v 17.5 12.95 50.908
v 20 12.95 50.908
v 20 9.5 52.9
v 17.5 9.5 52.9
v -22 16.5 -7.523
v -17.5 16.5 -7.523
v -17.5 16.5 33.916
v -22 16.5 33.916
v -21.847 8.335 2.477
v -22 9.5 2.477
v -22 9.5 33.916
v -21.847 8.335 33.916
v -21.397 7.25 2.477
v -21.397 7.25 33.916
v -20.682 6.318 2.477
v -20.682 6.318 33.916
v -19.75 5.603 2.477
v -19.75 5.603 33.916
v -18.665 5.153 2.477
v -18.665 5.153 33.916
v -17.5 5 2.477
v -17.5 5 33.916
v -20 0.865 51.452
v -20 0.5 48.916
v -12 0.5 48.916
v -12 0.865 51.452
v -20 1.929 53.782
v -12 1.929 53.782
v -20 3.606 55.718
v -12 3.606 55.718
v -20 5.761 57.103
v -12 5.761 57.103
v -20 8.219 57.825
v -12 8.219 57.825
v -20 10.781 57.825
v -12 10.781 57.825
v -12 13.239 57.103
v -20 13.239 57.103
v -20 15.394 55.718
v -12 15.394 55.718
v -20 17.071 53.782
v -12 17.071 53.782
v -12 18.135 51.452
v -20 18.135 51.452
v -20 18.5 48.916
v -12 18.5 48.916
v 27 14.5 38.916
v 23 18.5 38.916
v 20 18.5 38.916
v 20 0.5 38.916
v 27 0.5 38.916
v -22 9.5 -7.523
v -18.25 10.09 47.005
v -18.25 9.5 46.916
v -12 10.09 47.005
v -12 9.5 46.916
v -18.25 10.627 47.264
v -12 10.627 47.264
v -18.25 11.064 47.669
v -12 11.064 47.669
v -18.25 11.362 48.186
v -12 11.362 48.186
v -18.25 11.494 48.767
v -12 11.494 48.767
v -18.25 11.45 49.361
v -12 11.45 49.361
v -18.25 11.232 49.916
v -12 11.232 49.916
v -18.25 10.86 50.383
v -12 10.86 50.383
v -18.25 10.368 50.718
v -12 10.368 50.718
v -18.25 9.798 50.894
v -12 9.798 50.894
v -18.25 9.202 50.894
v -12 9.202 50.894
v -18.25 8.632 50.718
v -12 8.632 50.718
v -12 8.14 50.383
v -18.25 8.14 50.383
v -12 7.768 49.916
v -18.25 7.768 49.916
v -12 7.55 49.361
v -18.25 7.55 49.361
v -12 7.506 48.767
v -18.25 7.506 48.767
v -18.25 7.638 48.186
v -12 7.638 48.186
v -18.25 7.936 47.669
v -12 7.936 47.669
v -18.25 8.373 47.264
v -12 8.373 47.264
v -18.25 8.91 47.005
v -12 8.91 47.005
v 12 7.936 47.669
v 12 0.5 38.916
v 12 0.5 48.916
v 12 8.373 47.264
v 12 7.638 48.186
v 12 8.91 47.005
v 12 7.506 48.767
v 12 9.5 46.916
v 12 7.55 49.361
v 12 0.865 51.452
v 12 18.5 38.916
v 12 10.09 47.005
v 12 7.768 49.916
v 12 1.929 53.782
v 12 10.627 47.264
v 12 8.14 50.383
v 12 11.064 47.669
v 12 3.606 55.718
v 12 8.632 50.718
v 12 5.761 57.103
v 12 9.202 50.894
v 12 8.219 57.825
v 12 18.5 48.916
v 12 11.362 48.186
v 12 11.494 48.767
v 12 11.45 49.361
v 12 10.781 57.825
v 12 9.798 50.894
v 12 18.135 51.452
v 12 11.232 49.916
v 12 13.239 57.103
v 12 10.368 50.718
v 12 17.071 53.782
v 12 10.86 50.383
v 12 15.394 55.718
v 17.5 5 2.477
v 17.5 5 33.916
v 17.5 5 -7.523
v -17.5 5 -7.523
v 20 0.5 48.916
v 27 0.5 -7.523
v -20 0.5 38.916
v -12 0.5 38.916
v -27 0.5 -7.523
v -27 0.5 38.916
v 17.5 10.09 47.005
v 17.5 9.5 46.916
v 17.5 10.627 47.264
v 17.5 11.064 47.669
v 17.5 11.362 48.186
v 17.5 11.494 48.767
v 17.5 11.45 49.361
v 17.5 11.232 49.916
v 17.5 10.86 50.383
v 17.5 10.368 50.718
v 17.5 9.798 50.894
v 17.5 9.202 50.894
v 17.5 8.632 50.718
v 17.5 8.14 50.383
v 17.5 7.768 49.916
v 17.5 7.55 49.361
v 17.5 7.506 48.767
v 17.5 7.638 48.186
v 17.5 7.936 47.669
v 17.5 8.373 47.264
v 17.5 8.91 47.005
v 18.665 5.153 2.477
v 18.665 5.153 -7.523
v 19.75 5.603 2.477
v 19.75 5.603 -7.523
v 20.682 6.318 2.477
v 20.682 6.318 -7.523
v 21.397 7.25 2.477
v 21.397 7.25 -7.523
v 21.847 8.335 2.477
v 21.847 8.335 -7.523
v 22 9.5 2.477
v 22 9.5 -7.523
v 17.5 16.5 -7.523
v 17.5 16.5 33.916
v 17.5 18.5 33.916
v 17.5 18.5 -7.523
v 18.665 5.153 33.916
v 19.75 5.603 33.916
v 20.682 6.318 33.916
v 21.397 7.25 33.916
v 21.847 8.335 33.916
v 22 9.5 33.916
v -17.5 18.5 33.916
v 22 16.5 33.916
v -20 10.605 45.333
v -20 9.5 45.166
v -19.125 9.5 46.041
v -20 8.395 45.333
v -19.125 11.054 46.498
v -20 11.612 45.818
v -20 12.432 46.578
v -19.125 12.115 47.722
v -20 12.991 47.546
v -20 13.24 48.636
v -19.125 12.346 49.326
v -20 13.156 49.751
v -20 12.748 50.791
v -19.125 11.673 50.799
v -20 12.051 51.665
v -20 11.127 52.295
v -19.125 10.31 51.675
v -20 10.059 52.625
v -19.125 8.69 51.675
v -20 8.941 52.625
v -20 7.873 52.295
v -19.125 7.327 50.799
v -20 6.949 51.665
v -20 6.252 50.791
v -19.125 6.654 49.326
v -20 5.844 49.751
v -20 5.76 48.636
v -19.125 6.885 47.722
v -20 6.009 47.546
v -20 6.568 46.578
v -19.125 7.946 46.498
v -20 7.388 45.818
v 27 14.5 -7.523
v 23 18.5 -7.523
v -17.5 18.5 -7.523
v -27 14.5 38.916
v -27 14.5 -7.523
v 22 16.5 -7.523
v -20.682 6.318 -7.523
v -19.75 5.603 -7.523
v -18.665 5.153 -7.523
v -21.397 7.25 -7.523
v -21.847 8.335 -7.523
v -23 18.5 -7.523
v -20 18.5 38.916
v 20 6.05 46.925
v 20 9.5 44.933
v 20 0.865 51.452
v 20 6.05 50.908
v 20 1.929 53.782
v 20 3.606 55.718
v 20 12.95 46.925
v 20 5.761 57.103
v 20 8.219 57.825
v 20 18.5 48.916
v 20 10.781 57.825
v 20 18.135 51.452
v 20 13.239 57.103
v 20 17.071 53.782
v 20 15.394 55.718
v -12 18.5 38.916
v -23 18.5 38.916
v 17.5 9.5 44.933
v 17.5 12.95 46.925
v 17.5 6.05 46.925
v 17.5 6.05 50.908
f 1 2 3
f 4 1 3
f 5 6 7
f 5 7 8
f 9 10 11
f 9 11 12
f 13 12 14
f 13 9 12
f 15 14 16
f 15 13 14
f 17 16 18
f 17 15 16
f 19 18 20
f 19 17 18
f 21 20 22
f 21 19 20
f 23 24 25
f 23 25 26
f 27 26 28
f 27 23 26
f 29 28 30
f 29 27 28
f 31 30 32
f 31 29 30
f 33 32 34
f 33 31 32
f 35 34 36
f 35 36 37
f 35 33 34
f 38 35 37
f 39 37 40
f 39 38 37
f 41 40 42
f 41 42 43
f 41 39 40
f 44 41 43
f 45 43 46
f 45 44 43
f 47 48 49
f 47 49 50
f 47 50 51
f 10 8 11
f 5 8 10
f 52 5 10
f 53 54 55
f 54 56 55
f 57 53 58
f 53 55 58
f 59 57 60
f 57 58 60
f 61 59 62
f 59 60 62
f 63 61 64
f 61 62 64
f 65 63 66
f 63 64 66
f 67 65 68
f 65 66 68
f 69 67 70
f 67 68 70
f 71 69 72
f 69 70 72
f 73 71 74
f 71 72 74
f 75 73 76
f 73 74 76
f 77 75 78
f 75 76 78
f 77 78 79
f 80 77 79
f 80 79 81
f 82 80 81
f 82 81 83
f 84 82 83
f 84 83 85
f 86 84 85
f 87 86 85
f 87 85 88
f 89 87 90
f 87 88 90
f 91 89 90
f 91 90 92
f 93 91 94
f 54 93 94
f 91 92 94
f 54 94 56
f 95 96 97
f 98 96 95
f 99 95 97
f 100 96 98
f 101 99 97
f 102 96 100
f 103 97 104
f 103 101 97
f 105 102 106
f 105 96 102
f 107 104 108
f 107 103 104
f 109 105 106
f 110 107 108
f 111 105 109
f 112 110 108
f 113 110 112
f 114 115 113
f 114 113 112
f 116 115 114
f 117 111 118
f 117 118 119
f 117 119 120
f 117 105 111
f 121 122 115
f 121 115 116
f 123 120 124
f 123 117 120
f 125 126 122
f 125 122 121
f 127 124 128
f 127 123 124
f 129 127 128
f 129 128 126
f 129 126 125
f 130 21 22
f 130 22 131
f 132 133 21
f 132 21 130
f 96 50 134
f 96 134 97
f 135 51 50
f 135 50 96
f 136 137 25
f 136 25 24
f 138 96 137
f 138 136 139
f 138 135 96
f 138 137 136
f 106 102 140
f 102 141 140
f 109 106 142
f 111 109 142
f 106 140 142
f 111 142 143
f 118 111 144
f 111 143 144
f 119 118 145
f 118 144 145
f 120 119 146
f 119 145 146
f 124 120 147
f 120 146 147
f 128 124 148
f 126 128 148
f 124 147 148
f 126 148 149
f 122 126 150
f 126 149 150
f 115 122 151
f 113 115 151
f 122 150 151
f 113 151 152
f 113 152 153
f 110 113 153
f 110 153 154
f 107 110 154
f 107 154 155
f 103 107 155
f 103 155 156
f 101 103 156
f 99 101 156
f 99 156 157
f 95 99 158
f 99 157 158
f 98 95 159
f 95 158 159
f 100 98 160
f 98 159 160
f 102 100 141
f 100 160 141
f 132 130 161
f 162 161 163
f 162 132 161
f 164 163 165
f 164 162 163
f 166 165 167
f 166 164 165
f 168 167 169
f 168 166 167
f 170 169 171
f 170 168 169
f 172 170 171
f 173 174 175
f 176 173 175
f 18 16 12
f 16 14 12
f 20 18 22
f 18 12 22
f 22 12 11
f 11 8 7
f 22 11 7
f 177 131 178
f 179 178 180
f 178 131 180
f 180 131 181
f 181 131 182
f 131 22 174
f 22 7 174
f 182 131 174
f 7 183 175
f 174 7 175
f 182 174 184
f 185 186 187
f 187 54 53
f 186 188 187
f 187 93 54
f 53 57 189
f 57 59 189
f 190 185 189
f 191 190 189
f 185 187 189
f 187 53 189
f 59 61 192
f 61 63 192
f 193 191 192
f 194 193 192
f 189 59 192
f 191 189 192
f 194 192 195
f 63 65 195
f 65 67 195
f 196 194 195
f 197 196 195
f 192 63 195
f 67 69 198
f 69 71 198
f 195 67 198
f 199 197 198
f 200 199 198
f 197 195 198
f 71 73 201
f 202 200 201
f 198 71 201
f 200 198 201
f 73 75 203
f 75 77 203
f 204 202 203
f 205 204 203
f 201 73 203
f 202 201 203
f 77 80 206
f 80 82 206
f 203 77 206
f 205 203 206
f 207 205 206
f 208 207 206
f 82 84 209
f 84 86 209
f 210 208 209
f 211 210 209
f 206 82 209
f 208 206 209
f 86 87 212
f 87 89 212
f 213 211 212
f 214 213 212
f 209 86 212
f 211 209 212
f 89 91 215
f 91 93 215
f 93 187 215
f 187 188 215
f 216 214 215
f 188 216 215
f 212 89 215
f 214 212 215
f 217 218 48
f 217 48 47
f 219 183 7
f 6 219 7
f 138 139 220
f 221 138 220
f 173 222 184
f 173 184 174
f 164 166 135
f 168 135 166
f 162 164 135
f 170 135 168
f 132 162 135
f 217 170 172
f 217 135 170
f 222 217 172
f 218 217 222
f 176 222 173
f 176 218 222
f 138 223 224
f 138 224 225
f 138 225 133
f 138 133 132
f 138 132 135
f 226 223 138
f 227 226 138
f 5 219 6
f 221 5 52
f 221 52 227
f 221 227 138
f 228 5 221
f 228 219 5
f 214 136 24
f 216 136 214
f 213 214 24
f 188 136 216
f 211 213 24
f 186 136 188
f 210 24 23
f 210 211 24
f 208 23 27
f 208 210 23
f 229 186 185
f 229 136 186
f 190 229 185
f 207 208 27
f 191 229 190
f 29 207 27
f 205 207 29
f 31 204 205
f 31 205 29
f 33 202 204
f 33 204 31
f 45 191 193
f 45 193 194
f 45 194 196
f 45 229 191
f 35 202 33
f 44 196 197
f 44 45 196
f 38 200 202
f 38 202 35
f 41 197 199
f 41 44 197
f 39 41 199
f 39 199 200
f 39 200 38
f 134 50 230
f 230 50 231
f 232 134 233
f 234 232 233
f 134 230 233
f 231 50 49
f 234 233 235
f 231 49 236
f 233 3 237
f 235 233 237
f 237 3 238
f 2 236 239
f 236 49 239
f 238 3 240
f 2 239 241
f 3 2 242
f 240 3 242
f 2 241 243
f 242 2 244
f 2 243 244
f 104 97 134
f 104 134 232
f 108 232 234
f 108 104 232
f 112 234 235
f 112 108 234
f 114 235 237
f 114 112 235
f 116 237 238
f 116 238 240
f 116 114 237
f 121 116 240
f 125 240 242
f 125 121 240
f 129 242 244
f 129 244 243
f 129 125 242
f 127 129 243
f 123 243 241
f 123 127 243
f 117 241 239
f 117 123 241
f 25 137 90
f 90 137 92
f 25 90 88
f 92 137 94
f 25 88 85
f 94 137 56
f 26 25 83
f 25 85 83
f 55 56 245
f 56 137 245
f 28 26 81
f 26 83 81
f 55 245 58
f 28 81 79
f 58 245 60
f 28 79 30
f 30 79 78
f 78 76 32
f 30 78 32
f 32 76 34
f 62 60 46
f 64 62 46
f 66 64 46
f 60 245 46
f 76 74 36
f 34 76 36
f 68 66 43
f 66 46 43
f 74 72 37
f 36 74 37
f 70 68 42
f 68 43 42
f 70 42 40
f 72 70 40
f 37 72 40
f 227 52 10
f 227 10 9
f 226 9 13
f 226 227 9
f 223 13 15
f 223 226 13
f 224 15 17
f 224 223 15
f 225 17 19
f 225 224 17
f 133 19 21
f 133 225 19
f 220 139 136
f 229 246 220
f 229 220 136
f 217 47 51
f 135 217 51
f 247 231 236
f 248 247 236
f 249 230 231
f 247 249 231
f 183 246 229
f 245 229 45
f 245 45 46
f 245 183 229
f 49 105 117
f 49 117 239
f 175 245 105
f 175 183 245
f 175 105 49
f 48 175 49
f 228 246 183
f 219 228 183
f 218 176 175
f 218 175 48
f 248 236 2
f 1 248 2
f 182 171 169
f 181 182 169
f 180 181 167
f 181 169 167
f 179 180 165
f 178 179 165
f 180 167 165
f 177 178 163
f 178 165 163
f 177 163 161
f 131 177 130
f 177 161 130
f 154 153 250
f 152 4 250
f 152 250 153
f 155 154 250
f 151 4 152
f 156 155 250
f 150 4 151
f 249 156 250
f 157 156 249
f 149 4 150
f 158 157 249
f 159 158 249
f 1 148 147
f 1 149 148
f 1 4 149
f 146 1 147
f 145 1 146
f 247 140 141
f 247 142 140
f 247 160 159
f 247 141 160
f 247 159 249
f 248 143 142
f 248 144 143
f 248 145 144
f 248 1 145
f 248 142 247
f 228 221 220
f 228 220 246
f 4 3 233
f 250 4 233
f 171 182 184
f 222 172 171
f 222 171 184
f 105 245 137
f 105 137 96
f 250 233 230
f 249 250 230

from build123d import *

# Parameters (mm, degrees)
SKETCH1_W                     = 56
SKETCH1_H                     = 45
BOSS_EXTRUDE1_DEPTH           = 5
BOSS_EXTRUDE2_DEPTH           = 5
SKETCH3_W                     = 56
SKETCH3_H                     = 8.40027106
CUT_EXTRUDE1_DEPTH            = 0.5
BOSS_EXTRUDE3_DEPTH           = 3.5
SKETCH5_W                     = 5
SKETCH5_H                     = 3.247037966
CUT_EXTRUDE2_DEPTH            = 3.5
BOSS_EXTRUDE4_DEPTH           = 16.416410101
BOSS_EXTRUDE5_DEPTH           = 54
CHAMFER1_SIZE                 = 4
CSK_FOR_M4_SFHCS1_D           = 4
CSK_FOR_M4_SFHCS1_DEPTH       = 5
CSK_FOR_M4_SFHCS1_CSINK_D     = 7.6
CSK_FOR_M4_SFHCS1_CSINK_ANGLE = 90
CUT_EXTRUDE3_DEPTH            = 80.660134165
CUT_EXTRUDE3_DEPTH_BACK       = 80.660134165
SKETCH11_W                    = 8
SKETCH11_H                    = 16.218738619
FILLET1_R                     = 4.5
CUT_EXTRUDE4_START            = 18
CUT_EXTRUDE4_DEPTH            = 18
BOSS_EXTRUDE6_DEPTH           = 18
BOSS_EXTRUDE7_START           = -90
BOSS_EXTRUDE7_DEPTH           = 18
SKETCH16_W                    = 118.653956423
SKETCH16_H                    = 92.574487852
CUT_EXTRUDE5_DEPTH            = 39
SKETCH17_W                    = 131.858911514
SKETCH17_H                    = 83.404733186
CUT_EXTRUDE6_DEPTH            = 86
SKETCH18_W                    = 99.193977615
SKETCH18_H                    = 87.816890576
CUT_EXTRUDE7_DEPTH            = 109
SKETCH19_W                    = 81.935577426
SKETCH19_H                    = 38.938723706
CUT_EXTRUDE8_DEPTH            = 24.977359313
BOSS_EXTRUDE8_START           = 10
BOSS_EXTRUDE8_DEPTH           = 10
BOSS_EXTRUDE9_DEPTH           = 5
SKETCH22_W                    = 8
SKETCH22_H                    = 18
BOSS_EXTRUDE10_DEPTH          = 10
BOSS_EXTRUDE11_START          = -8
BOSS_EXTRUDE11_DEPTH          = 8
BOSS_EXTRUDE12_START          = -40
BOSS_EXTRUDE12_DEPTH          = 8
CSK_FOR_M4_SFHCS2_D           = 4
CSK_FOR_M4_SFHCS2_DEPTH       = 40
CSK_FOR_M4_SFHCS2_CSINK_D     = 7.5
CSK_FOR_M4_SFHCS2_CSINK_ANGLE = 90
CSK_FOR_M4_SFHCS2_TIP         = 1.201721238
CUT_EXTRUDE9_DEPTH            = 2.5


with BuildPart() as part:
    # Sketch1 → Boss-Extrude1 (new body)
    with BuildSketch(Plane(origin=(0, 0, 0), x_dir=(1, 0, 0), z_dir=(0, 1, 0))):
        Rectangle(SKETCH1_W, SKETCH1_H)
    extrude(amount=BOSS_EXTRUDE1_DEPTH)

    # Sketch2 → Boss-Extrude2 (add)
    with BuildSketch(Plane.XZ):
        Polygon((-45, -6.940200144), (-24, 6.697359313), (24, 6.697359313), (45, -6.940200144), (45, 3.059799856), (28, 14.09972894), (-28, 14.09972894), (-45, 3.059799856), align=None)
    extrude(amount=BOSS_EXTRUDE2_DEPTH)

    # Sketch3 → Cut-Extrude1 (cut)
    with BuildSketch(Plane.XZ):
        with Locations((0, 18.29986447)):
            Rectangle(SKETCH3_W, SKETCH3_H)
    extrude(amount=-CUT_EXTRUDE1_DEPTH, mode=Mode.SUBTRACT)

    # Sketch4 → Boss-Extrude3 (add)
    with BuildSketch(Plane(origin=(0, 0, 0), x_dir=(1, 0, 0), z_dir=(0, 1, 0))):
        Polygon((28, -40.539929084), (28, 22.5), (45, 22.5), (45, -29.5), align=None)
        Polygon((-28, -4.09972894), (-28, 22.5), (-45, 22.5), (-45, 6.940200144), align=None)
        Polygon((-28, -40.539929084), (-28, -14.09972894), (-45, -3.059799856), (-45, -29.5), align=None)
        Polygon((-45, -3.059799856), (-28, -14.09972894), (-28, -4.09972894), (-45, 6.940200144), align=None)
    extrude(amount=BOSS_EXTRUDE3_DEPTH)

    # Sketch5 → Cut-Extrude2 (cut)
    with BuildSketch(Plane(origin=(0, 3.5, 0), x_dir=(1, 0, 0), z_dir=(0, 1, 0))):
        with Locations((-28, -40.539929084)):
            Rectangle(SKETCH5_W, SKETCH5_H)
        with Locations((28, -40.539929084)):
            Rectangle(SKETCH5_W, SKETCH5_H)
    extrude(amount=-CUT_EXTRUDE2_DEPTH, mode=Mode.SUBTRACT)

    # Sketch6 → Boss-Extrude4 (add)
    with BuildSketch(Plane.XY.offset(22.5)):
        Polygon((-28, 0.5), (28, 0.5), (28, 3.5), (28, 5), (-28, 5), (-28, 3.5), align=None)
    extrude(amount=BOSS_EXTRUDE4_DEPTH)

    # Sketch8 → Boss-Extrude5 (add)
    with BuildSketch(Plane.XY.offset(38.916410101)):
        Polygon((-22, 5), (-22, 16.5), (-17.5, 16.5), (-17.5, 18.5), (-27, 18.5), (-27, 16.5), (-27, 5), align=None)
        Polygon((27, 5), (27, 16.5), (27, 18.5), (17.5, 18.5), (17.5, 16.5), (22, 16.5), (22, 5), align=None)
    extrude(amount=-BOSS_EXTRUDE5_DEPTH)

    # Chamfer1
    chamfer1_edges = [part.edges().sort_by_distance(p)[0] for p in [
        (-27, 18.5, 11.916410101),
        (27, 18.5, 11.916410101),
    ]]
    chamfer(chamfer1_edges, length=CHAMFER1_SIZE)

    # CSK for M4 SFHCS1
    with Locations(Plane(origin=(0, 5, 0), x_dir=(1, 0, 0), z_dir=(0, 1, 0))):
        with Locations((-17, 1.522640687), (17, 1.522640687)):
            CounterSinkHole(CSK_FOR_M4_SFHCS1_D / 2, CSK_FOR_M4_SFHCS1_CSINK_D / 2, depth=CSK_FOR_M4_SFHCS1_DEPTH, counter_sink_angle=CSK_FOR_M4_SFHCS1_CSINK_ANGLE)

    # Sketch11 → Cut-Extrude3 (cut, two sides: drawn at the far end of the back side and taken through both)
    with BuildSketch(Plane.ZY.offset(-22).offset(-CUT_EXTRUDE3_DEPTH_BACK)):
        with Locations((-1.522640687, 13.109369309)):
            Rectangle(SKETCH11_W, SKETCH11_H)
    extrude(amount=CUT_EXTRUDE3_DEPTH + CUT_EXTRUDE3_DEPTH_BACK, mode=Mode.SUBTRACT)

    # Fillet1
    fillet1_edges = [part.edges().sort_by_distance(p)[0] for p in [
        (-22, 5, -10.303115293),
        (22, 5, -10.303115293),
        (-22, 5, 20.696884707),
        (22, 5, 20.696884707),
    ]]
    fillet(fillet1_edges, radius=FILLET1_R)

    # Sketch14 → Cut-Extrude4 (cut)
    with BuildSketch(Plane(origin=(0, 0, 2.477359313), x_dir=(-1, 0, 0), z_dir=(0, 0, -1)).offset(CUT_EXTRUDE4_START)):
        with BuildLine():
            Line((-27, 5), (-17.5, 5))
            ThreePointArc((-17.5, 5), (-20.681980515, 6.318019485), (-22, 9.5))
            Line((-22, 9.5), (-22, 16.5))
            Line((-22, 16.5), (-17.5, 16.5))
            Line((-17.5, 16.5), (-17.5, 18.5))
            Line((-17.5, 18.5), (-23, 18.5))
            Line((-23, 18.5), (-27, 14.5))
            Line((-27, 14.5), (-27, 5))
        make_face()
        with BuildLine():
            Line((22, 16.5), (22, 9.5))
            ThreePointArc((22, 9.5), (20.681980515, 6.318019485), (17.5, 5))
            Line((17.5, 5), (27, 5))
            Line((27, 5), (27, 14.5))
            Line((27, 14.5), (23, 18.5))
            Line((23, 18.5), (17.5, 18.5))
            Line((17.5, 18.5), (17.5, 16.5))
            Line((17.5, 16.5), (22, 16.5))
        make_face()
    extrude(amount=-CUT_EXTRUDE4_DEPTH, mode=Mode.SUBTRACT)

    # Sketch15 → Boss-Extrude6 (add)
    with BuildSketch(Plane.ZY.offset(45)):
        Polygon((29.5, 3.5), (49.5, 3.5), (60.311407923, -47.363675238), (55.199704948, -47.363675238), (45.132244992, 0), (29.5, 0), align=None)
    extrude(amount=-BOSS_EXTRUDE6_DEPTH)

    # Sketch15<3> → Boss-Extrude7 (add)
    with BuildSketch(Plane.ZY.offset(45).offset(BOSS_EXTRUDE7_START)):
        Polygon((29.5, 3.5), (49.5, 3.5), (60.311407923, -47.363675238), (55.199704948, -47.363675238), (45.132244992, 0), (29.5, 0), align=None)
    extrude(amount=BOSS_EXTRUDE7_DEPTH)

    # Sketch16 → Cut-Extrude5 (cut)
    with BuildSketch(Plane.ZY.offset(27)):
        with Locations((22.108445716, -11.305351621)):
            Rectangle(SKETCH16_W, SKETCH16_H)
    extrude(amount=CUT_EXTRUDE5_DEPTH, mode=Mode.SUBTRACT)

    # Sketch17 → Cut-Extrude6 (cut)
    with BuildSketch(Plane(origin=(27, 0, 0), x_dir=(0, 0, -1), z_dir=(1, 0, 0))):
        with Locations((-19.541168595, -14.670136857)):
            Rectangle(SKETCH17_W, SKETCH17_H)
    extrude(amount=CUT_EXTRUDE6_DEPTH, mode=Mode.SUBTRACT)

    # Sketch18 → Cut-Extrude7 (cut)
    with BuildSketch(Plane.XZ.offset(-0.5)):
        with Locations((2.429482128, 7.437881449)):
            Rectangle(SKETCH18_W, SKETCH18_H)
    extrude(amount=CUT_EXTRUDE7_DEPTH, mode=Mode.SUBTRACT)

    # Sketch19 → Cut-Extrude8 (cut)
    with BuildSketch(Plane(origin=(0, 0, -22.5), x_dir=(-1, 0, 0), z_dir=(0, 0, -1))):
        with Locations((6.570305737, 10.128043931)):
            Rectangle(SKETCH19_W, SKETCH19_H)
    extrude(amount=-CUT_EXTRUDE8_DEPTH, mode=Mode.SUBTRACT)

    # Sketch20 → Boss-Extrude8 (add)
    with BuildSketch(Plane(origin=(0, 0, 2.477359313), x_dir=(-1, 0, 0), z_dir=(0, 0, -1)).offset(BOSS_EXTRUDE8_START)):
        with BuildLine():
            Line((-27, 14.5), (-27, 0.5))
            Line((-27, 0.5), (27, 0.5))
            Line((27, 0.5), (27, 14.5))
            Line((27, 14.5), (23, 18.5))
            Line((23, 18.5), (17.5, 18.5))
            Line((17.5, 18.5), (17.5, 16.5))
            Line((17.5, 16.5), (22, 16.5))
            Line((22, 16.5), (22, 9.5))
            ThreePointArc((22, 9.5), (20.681980515, 6.318019485), (17.5, 5))
            Line((17.5, 5), (-17.5, 5))
            ThreePointArc((-17.5, 5), (-20.681980515, 6.318019485), (-22, 9.5))
            Line((-22, 9.5), (-22, 16.5))
            Line((-22, 16.5), (-17.5, 16.5))
            Line((-17.5, 16.5), (-17.5, 18.5))
            Line((-17.5, 18.5), (-23, 18.5))
            Line((-23, 18.5), (-27, 14.5))
        make_face()
    extrude(amount=-BOSS_EXTRUDE8_DEPTH)

    # Sketch21 → Boss-Extrude9 (add)
    with BuildSketch(Plane.XY.offset(38.916410101)):
        Polygon((17.5, 18.5), (-17.5, 18.5), (-23, 18.5), (-27, 14.5), (-27, 0.5), (27, 0.5), (27, 14.5), (23, 18.5), align=None)
    extrude(amount=-BOSS_EXTRUDE9_DEPTH)

    # Sketch22 → Boss-Extrude10 (add)
    with BuildSketch(Plane.XY.offset(38.916410101)):
        with Locations((-16, 9.5)):
            Rectangle(SKETCH22_W, SKETCH22_H)
        with Locations((16, 9.5)):
            Rectangle(SKETCH22_W, SKETCH22_H)
    extrude(amount=BOSS_EXTRUDE10_DEPTH)

    # Sketch23 → Boss-Extrude11 (add)
    with BuildSketch(Plane(origin=(20, 0, 0), x_dir=(0, 0, -1), z_dir=(1, 0, 0)).offset(BOSS_EXTRUDE11_START)):
        with BuildLine():
            Line((-48.916410101, 18.5), (-48.916410101, 0.5))
            ThreePointArc((-48.916410101, 0.5), (-57.916410101, 9.5), (-48.916410101, 18.5))
        make_face()
    extrude(amount=BOSS_EXTRUDE11_DEPTH)

    # Sketch23<2> → Boss-Extrude12 (add)
    with BuildSketch(Plane(origin=(20, 0, 0), x_dir=(0, 0, -1), z_dir=(1, 0, 0)).offset(BOSS_EXTRUDE12_START)):
        with BuildLine():
            Line((-48.916410101, 18.5), (-48.916410101, 0.5))
            ThreePointArc((-48.916410101, 0.5), (-57.916410101, 9.5), (-48.916410101, 18.5))
        make_face()
    extrude(amount=BOSS_EXTRUDE12_DEPTH)

    # CSK for M4 SFHCS2
    with Locations(Plane.ZY.offset(20)):
        with Locations((48.916410101, 9.5)):
            CounterSinkHole(CSK_FOR_M4_SFHCS2_D / 2, CSK_FOR_M4_SFHCS2_CSINK_D / 2, depth=CSK_FOR_M4_SFHCS2_DEPTH, counter_sink_angle=CSK_FOR_M4_SFHCS2_CSINK_ANGLE)
            with Locations((0, 0, -(CSK_FOR_M4_SFHCS2_DEPTH + CSK_FOR_M4_SFHCS2_TIP / 2))):  # 118° drill point
                Cone(0, CSK_FOR_M4_SFHCS2_D / 2, CSK_FOR_M4_SFHCS2_TIP, mode=Mode.SUBTRACT)

    # Sketch27 → Cut-Extrude9 (cut)
    with BuildSketch(Plane(origin=(20, 0, 0), x_dir=(0, 0, -1), z_dir=(1, 0, 0))):
        Polygon((-44.932693244, 9.5), (-46.924551673, 12.95), (-50.90826853, 12.95), (-52.900126959, 9.5), (-50.90826853, 6.05), (-46.924551673, 6.05), align=None)
    extrude(amount=-CUT_EXTRUDE9_DEPTH, mode=Mode.SUBTRACT)


solid = part.part
